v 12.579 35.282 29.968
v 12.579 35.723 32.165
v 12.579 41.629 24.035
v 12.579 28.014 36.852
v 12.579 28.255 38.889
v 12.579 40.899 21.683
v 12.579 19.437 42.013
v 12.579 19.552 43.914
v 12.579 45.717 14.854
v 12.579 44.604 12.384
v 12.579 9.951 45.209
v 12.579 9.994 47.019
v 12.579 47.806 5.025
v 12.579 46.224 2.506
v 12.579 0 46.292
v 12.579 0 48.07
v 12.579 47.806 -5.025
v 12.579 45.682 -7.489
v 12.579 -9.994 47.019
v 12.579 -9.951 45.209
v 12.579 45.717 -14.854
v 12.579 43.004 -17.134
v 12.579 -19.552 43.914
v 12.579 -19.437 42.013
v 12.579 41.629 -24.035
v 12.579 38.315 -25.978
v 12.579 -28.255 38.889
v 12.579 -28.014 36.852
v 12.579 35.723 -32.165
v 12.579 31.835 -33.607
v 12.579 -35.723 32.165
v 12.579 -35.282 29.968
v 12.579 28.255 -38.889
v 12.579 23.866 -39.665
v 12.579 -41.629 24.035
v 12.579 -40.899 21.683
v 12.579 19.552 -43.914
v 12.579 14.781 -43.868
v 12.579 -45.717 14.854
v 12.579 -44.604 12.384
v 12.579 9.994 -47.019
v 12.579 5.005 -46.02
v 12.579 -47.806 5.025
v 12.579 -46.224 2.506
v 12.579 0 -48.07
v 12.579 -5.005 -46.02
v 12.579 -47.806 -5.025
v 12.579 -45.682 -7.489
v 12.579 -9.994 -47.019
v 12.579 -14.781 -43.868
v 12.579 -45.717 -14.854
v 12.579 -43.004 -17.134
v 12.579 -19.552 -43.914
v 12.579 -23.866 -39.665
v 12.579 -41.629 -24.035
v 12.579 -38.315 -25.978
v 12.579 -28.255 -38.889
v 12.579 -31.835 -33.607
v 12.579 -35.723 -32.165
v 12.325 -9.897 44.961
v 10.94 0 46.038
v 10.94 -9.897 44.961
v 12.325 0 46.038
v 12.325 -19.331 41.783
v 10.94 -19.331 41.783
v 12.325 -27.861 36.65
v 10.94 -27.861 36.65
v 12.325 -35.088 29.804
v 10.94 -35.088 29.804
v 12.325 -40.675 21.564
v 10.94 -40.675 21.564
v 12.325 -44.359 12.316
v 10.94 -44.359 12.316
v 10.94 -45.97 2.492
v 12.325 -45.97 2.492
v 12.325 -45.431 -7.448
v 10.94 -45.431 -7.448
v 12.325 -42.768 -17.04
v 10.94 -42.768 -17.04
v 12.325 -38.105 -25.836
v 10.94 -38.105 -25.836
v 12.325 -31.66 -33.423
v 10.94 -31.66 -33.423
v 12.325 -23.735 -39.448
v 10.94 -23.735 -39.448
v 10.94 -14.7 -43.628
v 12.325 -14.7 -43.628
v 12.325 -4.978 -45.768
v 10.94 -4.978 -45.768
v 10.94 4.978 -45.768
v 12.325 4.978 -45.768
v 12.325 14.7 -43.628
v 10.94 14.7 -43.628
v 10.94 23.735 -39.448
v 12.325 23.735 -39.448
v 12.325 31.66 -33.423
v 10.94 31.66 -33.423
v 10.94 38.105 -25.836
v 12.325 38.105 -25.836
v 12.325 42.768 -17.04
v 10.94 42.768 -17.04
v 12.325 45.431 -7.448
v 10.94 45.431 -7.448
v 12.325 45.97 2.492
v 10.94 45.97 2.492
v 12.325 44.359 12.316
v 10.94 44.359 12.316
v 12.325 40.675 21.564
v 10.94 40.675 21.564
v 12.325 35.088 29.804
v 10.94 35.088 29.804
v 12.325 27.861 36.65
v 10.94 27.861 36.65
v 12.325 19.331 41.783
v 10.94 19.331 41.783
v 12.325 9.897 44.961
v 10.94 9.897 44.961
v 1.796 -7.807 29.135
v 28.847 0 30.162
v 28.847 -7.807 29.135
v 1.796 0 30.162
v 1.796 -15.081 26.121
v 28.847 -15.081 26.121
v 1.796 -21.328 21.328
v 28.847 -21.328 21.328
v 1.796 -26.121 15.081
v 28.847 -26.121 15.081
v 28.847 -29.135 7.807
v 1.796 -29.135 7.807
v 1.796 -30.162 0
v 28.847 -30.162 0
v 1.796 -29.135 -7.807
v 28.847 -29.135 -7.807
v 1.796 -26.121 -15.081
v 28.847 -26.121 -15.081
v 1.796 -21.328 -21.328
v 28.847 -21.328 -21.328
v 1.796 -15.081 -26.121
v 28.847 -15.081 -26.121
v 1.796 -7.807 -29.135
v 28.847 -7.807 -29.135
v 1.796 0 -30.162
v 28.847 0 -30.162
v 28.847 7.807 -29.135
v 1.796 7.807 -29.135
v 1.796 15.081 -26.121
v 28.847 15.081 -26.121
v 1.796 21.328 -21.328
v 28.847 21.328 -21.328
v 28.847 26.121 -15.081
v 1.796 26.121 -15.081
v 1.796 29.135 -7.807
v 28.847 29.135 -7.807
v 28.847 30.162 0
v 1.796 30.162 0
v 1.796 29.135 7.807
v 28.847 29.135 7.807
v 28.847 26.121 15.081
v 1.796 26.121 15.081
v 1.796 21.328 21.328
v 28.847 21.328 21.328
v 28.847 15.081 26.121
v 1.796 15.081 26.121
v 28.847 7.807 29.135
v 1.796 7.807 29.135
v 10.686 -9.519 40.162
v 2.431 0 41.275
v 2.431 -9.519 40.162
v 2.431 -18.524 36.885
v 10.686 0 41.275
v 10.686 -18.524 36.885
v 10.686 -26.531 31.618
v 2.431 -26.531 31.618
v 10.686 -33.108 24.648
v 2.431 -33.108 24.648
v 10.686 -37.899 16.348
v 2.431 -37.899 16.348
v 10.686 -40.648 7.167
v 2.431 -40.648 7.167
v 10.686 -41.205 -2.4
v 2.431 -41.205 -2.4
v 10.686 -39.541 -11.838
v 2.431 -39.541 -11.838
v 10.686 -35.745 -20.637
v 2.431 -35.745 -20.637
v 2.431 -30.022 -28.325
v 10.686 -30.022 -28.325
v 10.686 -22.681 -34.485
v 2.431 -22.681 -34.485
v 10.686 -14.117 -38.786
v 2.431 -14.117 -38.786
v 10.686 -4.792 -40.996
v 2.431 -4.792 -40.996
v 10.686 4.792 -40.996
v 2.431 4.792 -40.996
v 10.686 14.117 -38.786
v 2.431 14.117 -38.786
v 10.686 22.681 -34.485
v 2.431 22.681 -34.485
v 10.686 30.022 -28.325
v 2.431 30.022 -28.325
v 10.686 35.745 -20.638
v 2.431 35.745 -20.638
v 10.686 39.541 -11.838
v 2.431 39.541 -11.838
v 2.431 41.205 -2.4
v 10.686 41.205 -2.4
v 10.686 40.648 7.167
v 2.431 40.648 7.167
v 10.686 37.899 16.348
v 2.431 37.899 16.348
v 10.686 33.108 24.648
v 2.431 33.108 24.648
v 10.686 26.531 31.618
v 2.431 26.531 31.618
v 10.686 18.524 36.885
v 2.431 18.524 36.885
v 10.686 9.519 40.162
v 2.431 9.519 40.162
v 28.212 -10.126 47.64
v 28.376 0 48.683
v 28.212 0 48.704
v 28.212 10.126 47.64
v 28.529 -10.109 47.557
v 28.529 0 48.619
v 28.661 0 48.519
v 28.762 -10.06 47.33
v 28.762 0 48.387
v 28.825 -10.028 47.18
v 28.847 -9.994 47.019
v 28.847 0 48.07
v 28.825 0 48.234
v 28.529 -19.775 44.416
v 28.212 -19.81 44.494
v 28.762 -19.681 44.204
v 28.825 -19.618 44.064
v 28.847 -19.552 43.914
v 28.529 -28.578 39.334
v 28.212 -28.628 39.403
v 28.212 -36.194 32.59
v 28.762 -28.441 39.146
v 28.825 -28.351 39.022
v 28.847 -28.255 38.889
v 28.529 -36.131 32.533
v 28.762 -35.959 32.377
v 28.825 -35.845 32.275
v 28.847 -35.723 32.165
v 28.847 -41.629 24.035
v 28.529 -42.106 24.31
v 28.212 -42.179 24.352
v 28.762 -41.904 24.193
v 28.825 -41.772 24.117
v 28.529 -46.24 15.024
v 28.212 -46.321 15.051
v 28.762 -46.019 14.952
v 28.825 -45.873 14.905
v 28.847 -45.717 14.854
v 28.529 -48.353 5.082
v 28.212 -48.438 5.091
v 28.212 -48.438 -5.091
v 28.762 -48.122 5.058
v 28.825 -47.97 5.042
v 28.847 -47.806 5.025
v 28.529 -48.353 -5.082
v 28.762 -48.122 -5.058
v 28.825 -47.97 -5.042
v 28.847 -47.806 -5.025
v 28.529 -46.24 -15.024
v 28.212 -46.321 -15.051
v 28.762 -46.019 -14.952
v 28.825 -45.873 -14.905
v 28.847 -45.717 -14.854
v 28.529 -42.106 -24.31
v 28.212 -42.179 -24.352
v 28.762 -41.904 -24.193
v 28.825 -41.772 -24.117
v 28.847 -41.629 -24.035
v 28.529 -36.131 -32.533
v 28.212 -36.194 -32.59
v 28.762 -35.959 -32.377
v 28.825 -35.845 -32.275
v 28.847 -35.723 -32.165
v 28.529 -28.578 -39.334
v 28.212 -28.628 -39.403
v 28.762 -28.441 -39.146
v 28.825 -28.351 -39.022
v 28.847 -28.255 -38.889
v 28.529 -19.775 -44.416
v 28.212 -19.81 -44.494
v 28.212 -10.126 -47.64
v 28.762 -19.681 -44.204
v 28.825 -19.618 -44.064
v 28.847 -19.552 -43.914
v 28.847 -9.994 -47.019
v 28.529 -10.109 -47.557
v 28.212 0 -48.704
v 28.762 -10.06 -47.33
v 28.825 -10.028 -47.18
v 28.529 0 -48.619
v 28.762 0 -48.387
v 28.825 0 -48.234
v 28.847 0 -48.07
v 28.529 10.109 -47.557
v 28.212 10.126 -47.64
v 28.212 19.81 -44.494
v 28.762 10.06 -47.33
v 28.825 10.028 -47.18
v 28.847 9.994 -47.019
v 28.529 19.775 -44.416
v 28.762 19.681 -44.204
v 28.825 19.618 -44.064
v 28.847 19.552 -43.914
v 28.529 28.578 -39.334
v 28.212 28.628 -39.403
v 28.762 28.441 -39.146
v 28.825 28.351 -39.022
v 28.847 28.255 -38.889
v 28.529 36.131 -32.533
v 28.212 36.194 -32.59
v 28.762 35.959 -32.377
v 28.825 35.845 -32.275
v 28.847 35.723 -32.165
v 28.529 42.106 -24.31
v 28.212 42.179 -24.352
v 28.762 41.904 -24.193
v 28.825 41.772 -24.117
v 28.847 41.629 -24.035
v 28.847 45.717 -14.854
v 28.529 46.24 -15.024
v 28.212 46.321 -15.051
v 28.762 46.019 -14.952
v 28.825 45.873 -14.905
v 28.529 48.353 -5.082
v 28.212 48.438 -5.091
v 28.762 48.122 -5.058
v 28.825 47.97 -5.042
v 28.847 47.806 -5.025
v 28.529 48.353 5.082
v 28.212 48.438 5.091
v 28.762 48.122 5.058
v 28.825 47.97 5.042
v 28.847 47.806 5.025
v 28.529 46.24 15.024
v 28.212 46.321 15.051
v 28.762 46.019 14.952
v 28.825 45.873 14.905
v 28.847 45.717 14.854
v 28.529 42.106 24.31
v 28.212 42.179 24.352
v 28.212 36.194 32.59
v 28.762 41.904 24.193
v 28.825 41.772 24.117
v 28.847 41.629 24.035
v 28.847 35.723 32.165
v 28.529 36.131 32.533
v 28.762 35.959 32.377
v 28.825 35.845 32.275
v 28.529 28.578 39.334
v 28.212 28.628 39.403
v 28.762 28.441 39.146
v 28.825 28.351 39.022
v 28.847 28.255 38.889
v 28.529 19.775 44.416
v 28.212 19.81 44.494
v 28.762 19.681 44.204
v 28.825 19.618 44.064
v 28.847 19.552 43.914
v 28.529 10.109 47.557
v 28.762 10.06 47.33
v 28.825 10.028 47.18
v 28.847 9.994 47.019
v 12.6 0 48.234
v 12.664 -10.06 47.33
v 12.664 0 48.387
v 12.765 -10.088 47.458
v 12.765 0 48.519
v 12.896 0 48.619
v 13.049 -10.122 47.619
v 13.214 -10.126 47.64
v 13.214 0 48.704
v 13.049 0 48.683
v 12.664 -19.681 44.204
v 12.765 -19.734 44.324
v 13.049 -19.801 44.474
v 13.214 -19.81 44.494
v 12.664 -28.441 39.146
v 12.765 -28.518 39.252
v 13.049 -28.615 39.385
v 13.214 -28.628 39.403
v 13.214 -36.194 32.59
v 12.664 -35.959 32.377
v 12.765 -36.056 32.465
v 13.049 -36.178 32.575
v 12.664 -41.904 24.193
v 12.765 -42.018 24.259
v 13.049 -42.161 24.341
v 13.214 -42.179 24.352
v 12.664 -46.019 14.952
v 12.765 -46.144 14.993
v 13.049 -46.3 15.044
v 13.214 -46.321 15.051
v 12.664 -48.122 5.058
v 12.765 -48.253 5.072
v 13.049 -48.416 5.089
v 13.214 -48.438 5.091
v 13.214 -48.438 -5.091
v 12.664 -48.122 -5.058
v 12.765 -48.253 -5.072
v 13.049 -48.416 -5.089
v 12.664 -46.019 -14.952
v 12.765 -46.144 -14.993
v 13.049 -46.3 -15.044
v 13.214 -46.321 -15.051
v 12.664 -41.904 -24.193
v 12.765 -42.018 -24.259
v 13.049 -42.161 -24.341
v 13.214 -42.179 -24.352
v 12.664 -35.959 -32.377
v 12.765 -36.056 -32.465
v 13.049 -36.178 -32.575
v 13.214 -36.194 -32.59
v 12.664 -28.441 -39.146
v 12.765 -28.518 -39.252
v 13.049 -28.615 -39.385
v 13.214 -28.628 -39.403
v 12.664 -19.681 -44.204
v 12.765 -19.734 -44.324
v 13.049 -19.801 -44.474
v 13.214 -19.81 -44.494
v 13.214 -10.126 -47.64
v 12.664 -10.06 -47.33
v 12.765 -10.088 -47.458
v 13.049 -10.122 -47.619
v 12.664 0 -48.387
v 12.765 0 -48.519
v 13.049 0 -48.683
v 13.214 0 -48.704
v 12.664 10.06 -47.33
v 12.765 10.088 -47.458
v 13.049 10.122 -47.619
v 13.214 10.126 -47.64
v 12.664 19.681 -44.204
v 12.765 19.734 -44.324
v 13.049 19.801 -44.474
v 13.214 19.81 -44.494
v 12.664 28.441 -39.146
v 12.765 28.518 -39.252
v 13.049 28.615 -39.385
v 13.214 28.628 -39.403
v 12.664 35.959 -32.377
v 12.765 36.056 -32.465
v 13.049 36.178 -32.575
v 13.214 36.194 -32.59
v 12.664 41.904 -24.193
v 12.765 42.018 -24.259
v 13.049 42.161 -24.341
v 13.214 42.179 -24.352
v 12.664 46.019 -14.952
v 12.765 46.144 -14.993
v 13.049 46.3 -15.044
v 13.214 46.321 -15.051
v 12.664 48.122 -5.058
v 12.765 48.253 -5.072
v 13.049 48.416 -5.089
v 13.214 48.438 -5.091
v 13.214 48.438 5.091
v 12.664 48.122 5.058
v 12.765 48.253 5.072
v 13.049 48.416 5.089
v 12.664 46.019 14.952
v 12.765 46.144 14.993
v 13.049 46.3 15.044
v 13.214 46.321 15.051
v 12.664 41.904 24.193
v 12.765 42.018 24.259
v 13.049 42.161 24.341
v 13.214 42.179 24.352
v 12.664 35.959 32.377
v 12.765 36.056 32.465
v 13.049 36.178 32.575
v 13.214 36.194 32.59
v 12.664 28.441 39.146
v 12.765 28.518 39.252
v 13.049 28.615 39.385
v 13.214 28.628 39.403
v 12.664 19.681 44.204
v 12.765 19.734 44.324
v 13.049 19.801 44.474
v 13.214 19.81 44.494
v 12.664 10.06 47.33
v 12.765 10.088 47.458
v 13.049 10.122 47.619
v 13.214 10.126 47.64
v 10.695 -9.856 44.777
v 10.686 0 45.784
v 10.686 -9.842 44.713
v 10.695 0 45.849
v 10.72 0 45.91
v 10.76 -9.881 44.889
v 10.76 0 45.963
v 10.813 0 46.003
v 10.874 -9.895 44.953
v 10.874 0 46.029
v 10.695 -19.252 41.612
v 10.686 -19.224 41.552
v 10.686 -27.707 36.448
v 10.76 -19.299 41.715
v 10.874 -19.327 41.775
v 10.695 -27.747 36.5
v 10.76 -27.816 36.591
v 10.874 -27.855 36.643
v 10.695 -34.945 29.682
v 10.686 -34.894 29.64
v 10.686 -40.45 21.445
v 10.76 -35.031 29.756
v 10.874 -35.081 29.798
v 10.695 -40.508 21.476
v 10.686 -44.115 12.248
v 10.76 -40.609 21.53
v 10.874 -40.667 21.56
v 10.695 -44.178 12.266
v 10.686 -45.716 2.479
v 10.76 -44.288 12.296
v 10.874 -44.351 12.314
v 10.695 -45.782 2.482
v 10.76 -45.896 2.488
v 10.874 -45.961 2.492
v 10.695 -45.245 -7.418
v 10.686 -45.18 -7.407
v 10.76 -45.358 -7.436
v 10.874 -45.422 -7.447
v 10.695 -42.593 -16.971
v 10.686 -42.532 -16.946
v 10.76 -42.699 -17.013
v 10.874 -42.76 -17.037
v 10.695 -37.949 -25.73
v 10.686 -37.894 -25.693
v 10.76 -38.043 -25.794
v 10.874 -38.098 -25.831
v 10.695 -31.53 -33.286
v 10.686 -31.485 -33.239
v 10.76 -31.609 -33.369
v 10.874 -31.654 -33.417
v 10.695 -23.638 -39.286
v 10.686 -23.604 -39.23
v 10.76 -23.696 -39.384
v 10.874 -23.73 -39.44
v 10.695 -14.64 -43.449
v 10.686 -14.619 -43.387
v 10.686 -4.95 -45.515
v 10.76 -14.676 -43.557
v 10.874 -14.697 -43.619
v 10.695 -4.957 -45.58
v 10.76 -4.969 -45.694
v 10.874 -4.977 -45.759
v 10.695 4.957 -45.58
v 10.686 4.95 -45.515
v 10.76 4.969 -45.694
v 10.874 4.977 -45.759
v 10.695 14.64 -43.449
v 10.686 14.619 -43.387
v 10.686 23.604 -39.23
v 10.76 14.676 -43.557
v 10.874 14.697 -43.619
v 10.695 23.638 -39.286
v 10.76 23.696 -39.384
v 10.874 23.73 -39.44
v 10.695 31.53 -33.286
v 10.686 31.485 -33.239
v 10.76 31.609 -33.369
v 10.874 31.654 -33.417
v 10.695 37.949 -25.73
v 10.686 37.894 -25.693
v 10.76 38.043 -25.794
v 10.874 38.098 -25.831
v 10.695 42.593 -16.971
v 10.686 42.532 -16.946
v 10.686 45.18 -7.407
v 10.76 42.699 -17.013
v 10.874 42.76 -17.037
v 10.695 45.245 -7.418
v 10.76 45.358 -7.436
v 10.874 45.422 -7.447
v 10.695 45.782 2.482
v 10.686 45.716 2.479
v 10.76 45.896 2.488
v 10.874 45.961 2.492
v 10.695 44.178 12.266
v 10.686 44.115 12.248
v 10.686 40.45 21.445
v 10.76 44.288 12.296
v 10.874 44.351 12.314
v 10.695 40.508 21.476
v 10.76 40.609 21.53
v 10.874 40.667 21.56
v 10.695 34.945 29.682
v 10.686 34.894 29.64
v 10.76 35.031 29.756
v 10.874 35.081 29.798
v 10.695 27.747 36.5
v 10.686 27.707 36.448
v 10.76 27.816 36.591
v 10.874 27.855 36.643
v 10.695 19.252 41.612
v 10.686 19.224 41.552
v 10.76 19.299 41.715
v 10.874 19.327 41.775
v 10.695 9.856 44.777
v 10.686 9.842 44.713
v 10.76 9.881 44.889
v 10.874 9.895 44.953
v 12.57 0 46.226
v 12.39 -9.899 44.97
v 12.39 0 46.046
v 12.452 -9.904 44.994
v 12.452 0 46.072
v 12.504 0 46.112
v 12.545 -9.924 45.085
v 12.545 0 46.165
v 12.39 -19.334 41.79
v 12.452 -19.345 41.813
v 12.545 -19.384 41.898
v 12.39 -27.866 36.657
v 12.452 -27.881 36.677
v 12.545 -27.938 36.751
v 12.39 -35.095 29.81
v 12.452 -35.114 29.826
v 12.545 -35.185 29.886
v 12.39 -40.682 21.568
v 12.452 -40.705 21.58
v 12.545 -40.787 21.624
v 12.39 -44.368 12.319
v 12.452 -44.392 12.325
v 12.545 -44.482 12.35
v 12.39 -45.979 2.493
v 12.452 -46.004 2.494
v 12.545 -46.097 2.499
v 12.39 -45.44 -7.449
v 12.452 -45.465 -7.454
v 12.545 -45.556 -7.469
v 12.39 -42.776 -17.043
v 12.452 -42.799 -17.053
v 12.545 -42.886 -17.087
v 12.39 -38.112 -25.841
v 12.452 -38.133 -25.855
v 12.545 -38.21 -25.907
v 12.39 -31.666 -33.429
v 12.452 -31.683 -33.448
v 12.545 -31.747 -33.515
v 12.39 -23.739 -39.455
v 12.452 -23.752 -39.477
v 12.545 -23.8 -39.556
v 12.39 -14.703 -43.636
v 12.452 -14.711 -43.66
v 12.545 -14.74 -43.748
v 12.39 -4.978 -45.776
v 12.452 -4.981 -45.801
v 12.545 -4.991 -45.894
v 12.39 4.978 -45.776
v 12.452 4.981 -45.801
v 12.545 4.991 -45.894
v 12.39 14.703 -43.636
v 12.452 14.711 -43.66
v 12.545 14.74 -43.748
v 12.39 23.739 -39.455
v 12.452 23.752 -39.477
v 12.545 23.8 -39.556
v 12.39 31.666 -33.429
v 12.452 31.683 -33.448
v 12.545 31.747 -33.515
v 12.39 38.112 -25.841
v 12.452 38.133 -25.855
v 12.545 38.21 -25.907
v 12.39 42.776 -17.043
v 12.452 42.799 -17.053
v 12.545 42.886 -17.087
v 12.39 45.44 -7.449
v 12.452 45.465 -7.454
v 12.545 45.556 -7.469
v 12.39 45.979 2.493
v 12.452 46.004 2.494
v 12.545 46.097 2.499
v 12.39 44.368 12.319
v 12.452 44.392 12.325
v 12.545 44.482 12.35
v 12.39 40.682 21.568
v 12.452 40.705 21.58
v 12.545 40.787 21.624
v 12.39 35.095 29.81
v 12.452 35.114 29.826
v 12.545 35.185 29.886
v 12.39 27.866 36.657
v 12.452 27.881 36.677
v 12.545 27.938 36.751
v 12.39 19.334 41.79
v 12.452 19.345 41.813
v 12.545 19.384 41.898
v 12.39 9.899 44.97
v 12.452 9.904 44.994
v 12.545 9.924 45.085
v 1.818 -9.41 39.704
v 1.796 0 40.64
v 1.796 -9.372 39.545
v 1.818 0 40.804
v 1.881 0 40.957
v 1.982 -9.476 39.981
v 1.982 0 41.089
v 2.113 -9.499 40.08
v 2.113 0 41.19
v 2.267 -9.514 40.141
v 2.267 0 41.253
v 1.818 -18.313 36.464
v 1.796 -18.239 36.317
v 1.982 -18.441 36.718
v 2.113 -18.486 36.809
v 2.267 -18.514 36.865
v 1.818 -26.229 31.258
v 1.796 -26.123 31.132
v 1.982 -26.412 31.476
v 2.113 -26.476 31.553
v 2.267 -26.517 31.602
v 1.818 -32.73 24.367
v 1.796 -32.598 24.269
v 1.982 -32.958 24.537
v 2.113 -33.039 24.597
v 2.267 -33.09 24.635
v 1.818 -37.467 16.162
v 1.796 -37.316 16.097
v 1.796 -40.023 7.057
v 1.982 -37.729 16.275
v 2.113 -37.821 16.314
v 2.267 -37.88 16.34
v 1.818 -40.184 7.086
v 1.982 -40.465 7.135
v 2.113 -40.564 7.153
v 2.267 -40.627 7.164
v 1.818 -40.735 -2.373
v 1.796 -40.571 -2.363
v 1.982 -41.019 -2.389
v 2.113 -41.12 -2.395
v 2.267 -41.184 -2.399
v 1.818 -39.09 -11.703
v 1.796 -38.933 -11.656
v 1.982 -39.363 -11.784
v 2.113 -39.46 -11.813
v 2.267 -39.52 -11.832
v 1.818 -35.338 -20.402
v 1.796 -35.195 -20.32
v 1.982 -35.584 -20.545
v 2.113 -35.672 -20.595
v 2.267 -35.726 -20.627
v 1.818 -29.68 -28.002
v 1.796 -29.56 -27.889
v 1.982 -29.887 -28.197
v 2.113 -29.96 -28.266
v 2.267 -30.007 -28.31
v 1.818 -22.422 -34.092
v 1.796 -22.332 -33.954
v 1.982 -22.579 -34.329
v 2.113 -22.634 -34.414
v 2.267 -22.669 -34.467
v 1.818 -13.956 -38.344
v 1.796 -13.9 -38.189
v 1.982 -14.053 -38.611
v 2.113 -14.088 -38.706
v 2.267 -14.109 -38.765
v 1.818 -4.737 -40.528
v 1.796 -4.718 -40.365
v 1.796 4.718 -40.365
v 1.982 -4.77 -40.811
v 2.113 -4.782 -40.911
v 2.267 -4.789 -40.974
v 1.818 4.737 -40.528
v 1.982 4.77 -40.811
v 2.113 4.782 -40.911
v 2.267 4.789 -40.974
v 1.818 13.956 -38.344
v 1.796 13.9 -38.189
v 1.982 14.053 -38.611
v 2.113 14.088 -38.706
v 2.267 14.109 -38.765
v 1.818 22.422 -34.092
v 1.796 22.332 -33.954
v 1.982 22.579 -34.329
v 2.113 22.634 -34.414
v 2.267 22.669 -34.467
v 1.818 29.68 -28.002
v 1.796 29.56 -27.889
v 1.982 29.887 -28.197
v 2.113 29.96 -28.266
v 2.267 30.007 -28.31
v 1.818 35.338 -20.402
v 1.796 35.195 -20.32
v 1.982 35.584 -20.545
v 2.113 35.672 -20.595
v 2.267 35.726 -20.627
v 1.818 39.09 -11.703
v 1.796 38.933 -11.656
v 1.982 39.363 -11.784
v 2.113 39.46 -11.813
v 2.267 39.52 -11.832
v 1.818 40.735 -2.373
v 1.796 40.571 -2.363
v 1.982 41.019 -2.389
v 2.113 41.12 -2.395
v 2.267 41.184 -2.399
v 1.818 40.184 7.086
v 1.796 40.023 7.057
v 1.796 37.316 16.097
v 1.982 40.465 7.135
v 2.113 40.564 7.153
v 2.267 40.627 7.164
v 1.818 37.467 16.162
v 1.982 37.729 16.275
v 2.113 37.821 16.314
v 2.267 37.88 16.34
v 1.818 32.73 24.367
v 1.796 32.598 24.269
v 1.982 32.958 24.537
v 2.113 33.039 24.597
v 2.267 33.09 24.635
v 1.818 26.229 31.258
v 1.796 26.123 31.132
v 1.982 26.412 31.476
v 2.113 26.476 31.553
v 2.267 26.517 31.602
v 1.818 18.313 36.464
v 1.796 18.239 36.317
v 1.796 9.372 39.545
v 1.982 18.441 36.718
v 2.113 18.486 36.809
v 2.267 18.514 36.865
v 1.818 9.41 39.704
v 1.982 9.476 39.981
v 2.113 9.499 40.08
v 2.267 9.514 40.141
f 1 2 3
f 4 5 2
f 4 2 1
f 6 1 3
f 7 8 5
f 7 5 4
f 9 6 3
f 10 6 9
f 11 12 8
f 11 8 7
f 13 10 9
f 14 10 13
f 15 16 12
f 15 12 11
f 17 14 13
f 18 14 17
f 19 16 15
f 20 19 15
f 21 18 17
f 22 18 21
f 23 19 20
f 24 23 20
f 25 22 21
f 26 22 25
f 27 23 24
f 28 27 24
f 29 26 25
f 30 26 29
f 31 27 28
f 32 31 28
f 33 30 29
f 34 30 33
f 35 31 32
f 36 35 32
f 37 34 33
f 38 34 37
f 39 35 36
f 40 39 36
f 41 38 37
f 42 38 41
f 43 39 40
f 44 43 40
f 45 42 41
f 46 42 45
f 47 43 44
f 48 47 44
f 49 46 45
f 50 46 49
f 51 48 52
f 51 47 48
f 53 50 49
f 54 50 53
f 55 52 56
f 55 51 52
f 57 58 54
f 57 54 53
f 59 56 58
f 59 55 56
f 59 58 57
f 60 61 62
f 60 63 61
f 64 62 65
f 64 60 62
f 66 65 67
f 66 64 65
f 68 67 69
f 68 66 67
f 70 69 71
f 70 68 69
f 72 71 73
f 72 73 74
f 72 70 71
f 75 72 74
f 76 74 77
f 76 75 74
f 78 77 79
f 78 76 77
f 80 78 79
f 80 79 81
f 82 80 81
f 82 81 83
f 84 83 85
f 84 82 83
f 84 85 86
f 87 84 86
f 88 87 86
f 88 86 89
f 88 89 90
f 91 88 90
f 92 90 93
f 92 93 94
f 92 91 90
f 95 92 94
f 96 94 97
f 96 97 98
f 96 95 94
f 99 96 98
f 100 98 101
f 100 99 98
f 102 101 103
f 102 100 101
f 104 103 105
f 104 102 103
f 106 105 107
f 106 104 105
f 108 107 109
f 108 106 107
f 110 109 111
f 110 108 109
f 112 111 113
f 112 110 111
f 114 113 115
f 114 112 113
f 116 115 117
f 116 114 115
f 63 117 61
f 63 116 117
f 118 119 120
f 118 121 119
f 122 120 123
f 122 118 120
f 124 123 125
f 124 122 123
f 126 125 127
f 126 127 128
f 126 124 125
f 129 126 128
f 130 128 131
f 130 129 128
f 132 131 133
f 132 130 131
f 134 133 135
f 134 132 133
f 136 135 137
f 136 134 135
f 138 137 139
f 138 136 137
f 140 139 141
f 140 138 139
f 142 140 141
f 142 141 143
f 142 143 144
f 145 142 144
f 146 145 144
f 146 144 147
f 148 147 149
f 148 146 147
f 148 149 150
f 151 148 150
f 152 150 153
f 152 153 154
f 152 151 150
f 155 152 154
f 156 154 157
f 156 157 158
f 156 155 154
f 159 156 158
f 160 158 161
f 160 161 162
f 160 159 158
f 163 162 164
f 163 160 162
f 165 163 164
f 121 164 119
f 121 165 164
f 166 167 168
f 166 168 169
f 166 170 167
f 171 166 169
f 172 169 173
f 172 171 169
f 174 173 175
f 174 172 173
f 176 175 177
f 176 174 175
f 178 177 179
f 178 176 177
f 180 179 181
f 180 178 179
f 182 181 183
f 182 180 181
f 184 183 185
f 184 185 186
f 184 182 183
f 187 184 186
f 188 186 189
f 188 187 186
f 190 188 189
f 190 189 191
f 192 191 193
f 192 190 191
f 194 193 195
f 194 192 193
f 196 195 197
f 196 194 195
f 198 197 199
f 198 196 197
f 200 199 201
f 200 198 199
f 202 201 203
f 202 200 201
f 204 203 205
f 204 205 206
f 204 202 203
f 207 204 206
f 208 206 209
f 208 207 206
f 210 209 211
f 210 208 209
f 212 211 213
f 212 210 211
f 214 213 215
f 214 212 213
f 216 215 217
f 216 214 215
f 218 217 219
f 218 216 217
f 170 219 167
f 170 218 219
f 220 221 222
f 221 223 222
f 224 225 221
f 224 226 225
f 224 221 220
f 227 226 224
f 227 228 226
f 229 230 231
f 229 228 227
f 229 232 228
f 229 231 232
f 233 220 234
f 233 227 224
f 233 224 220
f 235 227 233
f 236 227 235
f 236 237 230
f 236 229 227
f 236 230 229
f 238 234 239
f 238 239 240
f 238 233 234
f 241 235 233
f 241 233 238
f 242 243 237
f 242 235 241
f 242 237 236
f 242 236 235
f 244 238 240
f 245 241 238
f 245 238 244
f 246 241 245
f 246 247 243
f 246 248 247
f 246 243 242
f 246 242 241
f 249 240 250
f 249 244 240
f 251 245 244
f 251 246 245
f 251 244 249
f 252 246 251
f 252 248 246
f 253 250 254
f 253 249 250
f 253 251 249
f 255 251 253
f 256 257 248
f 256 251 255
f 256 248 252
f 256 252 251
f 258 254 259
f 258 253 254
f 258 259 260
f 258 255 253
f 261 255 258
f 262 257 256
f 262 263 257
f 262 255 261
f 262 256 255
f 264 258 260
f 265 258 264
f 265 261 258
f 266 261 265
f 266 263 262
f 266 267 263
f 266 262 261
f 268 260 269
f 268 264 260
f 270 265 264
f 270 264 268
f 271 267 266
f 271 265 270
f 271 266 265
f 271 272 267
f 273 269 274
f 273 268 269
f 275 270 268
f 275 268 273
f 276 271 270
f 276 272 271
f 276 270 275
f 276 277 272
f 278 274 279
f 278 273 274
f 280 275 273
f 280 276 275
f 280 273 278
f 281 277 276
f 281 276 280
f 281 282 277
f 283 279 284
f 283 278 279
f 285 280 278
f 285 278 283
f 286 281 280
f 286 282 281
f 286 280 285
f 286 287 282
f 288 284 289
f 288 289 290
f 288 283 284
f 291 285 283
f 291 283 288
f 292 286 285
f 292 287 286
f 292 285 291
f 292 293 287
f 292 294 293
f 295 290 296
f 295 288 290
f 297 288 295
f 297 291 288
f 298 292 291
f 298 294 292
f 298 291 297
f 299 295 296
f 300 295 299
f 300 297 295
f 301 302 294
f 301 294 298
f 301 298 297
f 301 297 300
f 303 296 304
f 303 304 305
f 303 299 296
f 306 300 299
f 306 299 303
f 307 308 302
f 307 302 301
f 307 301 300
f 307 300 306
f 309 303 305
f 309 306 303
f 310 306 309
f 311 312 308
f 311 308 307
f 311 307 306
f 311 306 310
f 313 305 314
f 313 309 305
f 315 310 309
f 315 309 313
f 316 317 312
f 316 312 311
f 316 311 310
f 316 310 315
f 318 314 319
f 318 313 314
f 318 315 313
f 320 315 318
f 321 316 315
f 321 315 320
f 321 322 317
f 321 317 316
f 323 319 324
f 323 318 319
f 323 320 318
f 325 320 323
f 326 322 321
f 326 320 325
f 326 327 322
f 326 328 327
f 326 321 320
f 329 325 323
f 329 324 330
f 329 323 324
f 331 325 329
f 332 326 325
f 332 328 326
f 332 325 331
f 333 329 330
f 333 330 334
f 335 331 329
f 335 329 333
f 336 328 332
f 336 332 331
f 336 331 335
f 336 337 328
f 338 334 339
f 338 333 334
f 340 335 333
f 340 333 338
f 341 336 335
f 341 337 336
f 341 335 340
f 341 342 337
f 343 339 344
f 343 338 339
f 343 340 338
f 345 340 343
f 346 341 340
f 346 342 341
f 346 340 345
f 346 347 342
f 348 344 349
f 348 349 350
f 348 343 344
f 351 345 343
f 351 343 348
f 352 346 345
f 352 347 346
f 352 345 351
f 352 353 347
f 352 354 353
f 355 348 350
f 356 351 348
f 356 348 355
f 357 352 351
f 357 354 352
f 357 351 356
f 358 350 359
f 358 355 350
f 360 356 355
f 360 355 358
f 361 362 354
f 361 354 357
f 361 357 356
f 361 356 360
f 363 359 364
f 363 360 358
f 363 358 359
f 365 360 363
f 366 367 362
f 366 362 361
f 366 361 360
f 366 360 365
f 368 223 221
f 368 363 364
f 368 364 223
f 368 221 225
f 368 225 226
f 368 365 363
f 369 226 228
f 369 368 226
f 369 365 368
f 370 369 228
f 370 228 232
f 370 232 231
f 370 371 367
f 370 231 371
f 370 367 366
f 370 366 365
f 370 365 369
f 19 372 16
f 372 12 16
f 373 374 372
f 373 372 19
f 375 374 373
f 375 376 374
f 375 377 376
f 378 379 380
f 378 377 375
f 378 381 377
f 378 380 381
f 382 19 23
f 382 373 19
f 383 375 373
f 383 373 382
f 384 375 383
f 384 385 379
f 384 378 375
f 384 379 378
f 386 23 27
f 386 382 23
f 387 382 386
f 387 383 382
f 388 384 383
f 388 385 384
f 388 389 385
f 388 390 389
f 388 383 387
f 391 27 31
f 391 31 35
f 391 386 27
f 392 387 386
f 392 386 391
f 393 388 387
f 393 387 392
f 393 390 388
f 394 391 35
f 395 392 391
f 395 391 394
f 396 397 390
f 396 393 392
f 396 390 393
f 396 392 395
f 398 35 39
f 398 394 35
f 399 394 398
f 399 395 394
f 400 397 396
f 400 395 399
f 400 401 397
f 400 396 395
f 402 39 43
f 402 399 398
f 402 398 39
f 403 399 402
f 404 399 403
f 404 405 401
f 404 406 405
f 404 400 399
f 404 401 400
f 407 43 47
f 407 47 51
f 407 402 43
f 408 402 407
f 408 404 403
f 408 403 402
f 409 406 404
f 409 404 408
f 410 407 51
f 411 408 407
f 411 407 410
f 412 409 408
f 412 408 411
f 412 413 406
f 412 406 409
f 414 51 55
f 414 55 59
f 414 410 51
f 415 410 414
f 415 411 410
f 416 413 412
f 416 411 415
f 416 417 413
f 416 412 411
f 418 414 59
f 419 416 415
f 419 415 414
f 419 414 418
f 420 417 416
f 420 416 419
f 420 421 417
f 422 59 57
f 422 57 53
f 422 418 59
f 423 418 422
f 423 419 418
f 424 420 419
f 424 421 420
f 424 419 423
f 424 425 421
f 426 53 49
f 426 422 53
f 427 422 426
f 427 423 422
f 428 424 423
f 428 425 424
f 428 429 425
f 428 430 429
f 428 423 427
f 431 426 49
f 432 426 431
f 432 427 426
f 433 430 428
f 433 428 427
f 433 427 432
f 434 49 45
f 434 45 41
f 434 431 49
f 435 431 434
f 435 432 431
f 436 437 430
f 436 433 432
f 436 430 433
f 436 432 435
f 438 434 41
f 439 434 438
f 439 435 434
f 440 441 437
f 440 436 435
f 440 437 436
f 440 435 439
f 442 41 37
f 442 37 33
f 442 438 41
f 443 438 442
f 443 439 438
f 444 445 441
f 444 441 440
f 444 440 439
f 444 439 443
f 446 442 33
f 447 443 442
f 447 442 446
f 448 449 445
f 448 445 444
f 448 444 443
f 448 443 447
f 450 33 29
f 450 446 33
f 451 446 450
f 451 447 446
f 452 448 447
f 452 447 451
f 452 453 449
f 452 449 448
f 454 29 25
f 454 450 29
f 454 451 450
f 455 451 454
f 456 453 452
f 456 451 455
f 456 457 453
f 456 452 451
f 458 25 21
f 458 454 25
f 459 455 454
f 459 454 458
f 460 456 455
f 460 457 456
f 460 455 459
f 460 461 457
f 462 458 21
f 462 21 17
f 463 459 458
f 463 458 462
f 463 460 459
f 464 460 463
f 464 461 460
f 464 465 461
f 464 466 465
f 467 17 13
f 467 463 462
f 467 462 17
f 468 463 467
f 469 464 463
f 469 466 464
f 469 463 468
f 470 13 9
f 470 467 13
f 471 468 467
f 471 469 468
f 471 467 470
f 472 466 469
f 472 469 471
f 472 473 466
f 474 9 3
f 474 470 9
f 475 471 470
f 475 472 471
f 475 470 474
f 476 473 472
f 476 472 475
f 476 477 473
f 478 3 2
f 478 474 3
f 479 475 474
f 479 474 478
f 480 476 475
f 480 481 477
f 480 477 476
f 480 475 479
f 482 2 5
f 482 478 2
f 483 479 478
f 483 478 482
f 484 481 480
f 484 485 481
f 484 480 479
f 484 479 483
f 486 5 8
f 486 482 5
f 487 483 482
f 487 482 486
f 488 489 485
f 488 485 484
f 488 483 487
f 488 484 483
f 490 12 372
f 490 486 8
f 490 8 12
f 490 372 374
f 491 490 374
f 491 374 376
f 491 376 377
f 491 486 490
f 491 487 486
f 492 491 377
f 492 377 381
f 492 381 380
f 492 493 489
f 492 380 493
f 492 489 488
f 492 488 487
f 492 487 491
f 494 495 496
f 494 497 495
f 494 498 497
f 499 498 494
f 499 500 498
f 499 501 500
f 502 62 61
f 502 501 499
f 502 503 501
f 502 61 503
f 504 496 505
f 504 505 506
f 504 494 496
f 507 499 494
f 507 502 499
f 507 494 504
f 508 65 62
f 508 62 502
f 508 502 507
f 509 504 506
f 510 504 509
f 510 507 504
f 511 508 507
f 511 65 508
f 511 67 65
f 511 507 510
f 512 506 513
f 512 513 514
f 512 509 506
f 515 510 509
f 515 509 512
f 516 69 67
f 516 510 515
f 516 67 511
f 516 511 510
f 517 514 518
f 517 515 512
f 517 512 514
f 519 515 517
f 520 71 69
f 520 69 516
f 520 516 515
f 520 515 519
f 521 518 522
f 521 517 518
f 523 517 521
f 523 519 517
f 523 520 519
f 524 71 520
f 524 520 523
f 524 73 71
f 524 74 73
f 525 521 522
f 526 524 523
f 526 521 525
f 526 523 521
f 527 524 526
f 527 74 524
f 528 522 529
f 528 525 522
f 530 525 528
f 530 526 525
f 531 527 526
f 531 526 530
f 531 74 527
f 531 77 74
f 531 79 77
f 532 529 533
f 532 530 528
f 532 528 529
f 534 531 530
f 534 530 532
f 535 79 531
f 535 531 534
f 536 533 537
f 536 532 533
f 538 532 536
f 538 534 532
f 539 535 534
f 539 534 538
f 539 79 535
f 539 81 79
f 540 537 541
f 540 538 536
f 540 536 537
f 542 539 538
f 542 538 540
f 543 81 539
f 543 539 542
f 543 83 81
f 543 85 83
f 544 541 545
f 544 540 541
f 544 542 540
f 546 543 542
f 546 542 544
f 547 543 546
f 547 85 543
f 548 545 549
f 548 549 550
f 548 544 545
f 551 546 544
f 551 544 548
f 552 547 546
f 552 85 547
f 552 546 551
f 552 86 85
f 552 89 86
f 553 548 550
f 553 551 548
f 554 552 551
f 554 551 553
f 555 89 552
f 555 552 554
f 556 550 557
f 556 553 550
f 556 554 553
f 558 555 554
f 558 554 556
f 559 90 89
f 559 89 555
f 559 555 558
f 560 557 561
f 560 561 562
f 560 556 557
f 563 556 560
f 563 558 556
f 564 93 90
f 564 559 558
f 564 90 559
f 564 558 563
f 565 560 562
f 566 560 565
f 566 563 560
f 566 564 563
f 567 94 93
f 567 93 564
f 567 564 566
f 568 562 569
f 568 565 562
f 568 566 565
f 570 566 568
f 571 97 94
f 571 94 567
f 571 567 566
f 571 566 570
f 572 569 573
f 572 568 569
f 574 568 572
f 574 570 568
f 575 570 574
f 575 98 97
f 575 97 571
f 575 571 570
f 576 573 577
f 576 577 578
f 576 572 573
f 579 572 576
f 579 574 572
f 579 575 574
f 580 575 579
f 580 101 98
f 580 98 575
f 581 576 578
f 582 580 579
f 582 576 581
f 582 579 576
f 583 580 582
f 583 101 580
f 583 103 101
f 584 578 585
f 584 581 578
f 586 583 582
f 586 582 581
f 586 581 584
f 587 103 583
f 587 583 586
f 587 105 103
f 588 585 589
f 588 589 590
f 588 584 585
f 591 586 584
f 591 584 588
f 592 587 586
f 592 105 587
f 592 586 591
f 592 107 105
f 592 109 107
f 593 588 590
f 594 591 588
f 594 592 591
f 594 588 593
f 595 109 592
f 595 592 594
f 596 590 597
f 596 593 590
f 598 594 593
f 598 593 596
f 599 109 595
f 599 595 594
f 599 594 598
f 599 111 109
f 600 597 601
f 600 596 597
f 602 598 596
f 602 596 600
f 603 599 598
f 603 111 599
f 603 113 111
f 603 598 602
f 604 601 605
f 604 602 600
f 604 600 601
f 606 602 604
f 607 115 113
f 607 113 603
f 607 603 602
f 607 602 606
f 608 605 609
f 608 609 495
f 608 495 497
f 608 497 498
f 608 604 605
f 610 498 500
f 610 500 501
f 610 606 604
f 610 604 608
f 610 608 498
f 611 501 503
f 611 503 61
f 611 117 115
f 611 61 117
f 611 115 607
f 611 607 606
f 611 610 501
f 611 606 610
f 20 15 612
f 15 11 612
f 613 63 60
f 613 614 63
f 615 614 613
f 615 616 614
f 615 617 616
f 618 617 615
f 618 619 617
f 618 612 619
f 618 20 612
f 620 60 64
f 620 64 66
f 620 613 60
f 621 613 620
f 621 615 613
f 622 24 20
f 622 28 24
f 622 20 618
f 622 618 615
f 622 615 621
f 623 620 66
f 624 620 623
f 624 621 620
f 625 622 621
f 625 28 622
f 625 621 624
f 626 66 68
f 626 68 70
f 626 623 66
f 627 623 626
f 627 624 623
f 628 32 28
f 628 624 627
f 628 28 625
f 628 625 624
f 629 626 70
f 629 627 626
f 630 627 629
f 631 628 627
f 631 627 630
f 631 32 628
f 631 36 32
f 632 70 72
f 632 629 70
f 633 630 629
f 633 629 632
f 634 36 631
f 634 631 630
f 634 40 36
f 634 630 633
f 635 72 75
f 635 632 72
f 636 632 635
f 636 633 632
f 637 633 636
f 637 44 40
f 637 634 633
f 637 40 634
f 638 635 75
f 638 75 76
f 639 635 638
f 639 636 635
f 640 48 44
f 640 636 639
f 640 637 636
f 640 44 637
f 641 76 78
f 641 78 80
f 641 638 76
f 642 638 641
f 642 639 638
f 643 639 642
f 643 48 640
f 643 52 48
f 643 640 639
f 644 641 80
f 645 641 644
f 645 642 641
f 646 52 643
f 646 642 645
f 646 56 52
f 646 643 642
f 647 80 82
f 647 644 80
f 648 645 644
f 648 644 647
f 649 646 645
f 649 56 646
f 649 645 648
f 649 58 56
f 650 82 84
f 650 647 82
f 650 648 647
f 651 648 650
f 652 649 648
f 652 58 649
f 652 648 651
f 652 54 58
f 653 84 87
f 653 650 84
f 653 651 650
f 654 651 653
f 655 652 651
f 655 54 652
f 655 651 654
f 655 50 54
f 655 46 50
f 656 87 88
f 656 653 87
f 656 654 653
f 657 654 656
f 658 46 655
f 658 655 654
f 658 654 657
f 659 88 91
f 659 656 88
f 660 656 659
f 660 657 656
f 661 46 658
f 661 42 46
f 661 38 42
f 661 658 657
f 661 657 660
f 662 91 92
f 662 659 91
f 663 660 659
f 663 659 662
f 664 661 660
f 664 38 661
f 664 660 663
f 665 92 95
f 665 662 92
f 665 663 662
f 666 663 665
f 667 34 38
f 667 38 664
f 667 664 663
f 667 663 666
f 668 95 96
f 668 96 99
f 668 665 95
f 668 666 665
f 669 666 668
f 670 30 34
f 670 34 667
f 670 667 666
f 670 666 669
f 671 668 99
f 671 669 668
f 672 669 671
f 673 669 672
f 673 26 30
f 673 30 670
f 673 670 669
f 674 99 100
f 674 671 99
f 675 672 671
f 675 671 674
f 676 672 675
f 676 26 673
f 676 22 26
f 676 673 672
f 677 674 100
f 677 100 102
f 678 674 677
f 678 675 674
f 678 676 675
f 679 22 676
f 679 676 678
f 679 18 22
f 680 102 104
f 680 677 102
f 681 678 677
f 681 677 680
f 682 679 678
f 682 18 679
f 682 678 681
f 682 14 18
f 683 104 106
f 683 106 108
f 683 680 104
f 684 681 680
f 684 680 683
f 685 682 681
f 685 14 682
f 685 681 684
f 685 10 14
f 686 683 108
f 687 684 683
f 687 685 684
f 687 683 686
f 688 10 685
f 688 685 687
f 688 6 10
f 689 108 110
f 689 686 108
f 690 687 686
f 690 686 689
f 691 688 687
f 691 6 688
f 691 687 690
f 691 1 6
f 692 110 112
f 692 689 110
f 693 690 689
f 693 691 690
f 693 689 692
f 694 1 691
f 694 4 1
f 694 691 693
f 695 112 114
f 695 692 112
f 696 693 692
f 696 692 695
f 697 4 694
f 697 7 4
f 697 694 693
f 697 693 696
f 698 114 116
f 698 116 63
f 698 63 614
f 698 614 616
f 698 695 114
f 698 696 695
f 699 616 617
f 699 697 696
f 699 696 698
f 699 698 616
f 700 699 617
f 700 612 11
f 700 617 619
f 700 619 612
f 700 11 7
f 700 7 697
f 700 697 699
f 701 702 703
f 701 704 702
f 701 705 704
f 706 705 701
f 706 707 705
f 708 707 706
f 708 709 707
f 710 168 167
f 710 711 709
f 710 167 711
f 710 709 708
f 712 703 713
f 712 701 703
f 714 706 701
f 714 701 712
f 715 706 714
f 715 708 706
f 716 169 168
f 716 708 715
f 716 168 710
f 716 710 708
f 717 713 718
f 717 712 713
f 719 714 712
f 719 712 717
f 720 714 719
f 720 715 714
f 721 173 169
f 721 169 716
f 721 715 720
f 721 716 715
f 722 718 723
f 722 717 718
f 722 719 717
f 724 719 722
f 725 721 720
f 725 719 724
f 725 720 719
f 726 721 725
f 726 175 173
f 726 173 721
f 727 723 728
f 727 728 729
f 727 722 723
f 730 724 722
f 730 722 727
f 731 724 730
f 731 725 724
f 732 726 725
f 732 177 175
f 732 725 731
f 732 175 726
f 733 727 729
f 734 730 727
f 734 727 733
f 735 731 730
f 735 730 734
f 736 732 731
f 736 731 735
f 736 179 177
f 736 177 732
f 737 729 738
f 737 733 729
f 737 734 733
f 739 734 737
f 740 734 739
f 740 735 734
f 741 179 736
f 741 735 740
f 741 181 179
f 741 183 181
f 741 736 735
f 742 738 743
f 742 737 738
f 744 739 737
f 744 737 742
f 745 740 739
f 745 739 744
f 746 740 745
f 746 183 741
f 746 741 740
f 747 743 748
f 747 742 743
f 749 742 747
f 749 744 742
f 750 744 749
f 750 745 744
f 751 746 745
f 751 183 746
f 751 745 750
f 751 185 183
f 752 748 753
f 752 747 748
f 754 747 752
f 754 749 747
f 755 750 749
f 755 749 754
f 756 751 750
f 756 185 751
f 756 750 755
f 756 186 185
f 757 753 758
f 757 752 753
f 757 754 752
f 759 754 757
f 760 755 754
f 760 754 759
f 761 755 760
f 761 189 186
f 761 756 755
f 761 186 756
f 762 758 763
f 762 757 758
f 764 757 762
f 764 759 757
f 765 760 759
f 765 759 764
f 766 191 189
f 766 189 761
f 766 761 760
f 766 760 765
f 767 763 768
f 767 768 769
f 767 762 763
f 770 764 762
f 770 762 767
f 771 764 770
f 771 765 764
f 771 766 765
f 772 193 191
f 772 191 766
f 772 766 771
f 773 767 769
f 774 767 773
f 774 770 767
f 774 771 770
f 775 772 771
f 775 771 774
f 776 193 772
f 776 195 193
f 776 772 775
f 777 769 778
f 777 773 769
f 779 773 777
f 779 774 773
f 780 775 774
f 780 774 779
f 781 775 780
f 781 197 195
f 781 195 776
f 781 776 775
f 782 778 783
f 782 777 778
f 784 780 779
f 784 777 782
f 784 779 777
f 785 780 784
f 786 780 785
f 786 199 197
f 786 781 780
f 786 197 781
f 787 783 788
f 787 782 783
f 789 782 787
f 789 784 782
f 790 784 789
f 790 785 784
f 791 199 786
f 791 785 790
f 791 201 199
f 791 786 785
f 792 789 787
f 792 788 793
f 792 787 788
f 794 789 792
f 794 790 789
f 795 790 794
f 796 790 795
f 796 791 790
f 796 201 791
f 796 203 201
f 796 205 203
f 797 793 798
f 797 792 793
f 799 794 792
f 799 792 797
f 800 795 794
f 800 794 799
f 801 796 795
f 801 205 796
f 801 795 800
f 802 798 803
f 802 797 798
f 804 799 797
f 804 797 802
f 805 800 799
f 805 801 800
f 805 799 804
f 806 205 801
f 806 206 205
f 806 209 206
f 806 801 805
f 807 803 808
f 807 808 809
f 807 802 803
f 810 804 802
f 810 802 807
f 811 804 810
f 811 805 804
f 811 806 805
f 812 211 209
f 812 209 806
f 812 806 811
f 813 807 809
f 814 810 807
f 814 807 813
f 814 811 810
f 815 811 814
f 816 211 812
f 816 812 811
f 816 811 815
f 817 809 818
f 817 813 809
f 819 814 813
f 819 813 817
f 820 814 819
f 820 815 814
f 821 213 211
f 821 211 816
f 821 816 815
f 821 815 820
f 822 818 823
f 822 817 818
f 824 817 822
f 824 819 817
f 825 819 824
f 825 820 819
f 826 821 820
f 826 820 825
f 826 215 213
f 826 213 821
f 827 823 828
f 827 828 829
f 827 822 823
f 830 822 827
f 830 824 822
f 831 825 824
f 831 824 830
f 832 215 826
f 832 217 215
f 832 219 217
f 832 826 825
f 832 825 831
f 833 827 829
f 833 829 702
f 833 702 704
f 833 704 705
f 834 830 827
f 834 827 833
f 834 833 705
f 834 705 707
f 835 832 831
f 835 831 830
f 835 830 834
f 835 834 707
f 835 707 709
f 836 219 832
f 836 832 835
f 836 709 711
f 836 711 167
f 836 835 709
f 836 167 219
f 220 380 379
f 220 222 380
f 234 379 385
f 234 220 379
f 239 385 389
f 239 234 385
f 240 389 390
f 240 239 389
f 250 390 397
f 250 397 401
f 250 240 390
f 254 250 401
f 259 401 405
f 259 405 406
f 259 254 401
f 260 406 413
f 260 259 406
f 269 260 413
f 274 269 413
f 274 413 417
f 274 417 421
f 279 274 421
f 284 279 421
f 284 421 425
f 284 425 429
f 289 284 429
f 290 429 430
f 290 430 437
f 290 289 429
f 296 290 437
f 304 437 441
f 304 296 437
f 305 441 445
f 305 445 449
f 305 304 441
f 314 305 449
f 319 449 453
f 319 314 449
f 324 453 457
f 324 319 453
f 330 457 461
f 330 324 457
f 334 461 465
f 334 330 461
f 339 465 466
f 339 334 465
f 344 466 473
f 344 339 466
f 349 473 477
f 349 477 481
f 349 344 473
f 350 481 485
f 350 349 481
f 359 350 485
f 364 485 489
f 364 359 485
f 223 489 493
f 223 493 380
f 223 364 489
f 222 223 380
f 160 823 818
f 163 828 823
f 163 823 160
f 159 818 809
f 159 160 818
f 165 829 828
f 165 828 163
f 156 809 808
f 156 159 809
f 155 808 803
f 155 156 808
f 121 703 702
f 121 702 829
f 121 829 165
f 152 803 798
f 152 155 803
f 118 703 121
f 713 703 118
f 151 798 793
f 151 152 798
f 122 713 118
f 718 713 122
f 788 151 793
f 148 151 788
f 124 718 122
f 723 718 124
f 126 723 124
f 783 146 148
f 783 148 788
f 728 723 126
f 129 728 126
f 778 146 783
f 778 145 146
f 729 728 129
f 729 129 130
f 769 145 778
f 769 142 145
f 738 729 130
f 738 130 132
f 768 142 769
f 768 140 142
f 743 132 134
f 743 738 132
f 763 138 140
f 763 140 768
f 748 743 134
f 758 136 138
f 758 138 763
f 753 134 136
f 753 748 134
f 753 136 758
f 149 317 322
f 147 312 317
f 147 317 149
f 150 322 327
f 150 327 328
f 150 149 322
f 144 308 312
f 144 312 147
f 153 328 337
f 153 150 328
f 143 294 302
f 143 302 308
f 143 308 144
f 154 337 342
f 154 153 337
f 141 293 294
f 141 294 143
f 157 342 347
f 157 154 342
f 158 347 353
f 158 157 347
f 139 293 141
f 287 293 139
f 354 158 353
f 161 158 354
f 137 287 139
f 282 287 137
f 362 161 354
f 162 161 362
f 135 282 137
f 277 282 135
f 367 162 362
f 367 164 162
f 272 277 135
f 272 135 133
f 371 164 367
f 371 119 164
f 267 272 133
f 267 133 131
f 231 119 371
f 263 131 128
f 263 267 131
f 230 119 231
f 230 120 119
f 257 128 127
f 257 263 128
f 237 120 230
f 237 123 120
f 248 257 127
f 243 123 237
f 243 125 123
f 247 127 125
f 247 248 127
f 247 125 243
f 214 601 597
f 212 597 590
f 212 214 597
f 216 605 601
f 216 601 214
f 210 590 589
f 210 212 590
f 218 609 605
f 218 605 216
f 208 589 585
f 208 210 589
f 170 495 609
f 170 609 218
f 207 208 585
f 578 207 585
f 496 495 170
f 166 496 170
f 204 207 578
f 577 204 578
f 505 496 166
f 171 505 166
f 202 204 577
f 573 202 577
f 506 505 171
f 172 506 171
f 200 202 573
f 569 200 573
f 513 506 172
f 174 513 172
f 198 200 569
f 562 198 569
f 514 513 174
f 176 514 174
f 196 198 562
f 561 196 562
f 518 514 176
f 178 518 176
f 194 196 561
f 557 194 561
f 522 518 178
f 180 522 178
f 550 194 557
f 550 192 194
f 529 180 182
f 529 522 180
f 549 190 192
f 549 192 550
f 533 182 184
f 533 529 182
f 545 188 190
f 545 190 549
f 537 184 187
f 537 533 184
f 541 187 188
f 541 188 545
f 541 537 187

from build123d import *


with BuildPart() as part:
    # Sketch1 → Revolve1 (revolve)
    with BuildSketch(Plane.XY, mode=Mode.PRIVATE) as revolve1_sk:
        with BuildLine():
            Line((1.795946189, 30.1625), (1.795946189, 40.64))
            ThreePointArc((1.795946189, 40.64), (1.981933383, 41.089012806), (2.430946189, 41.275))
            Line((2.430946189, 41.275), (10.685946189, 41.275))
            Line((10.685946189, 41.275), (10.685946189, 45.7835))
            ThreePointArc((10.685946189, 45.7835), (10.760341067, 45.963105122), (10.939946189, 46.0375))
            Line((10.939946189, 46.0375), (12.324748868, 46.0375))
            ThreePointArc((12.324748868, 46.0375), (12.50435399, 46.111894878), (12.578748868, 46.2915))
            Line((12.578748868, 46.2915), (12.578748868, 48.0695))
            ThreePointArc((12.578748868, 48.0695), (12.764736062, 48.518512806), (13.213748868, 48.7045))
            Line((13.213748868, 48.7045), (28.211946189, 48.7045))
            ThreePointArc((28.211946189, 48.7045), (28.660958995, 48.518512806), (28.846946189, 48.0695))
            Line((28.846946189, 48.0695), (28.846946189, 30.1625))
            Line((28.846946189, 30.1625), (1.795946189, 30.1625))
        make_face()
    revolve(revolve1_sk.sketch.rotate(Axis((0, 0, 0), (1, 0, 0)), 90), axis=Axis((0, 0, 0), (1, 0, 0)))


solid = part.part
